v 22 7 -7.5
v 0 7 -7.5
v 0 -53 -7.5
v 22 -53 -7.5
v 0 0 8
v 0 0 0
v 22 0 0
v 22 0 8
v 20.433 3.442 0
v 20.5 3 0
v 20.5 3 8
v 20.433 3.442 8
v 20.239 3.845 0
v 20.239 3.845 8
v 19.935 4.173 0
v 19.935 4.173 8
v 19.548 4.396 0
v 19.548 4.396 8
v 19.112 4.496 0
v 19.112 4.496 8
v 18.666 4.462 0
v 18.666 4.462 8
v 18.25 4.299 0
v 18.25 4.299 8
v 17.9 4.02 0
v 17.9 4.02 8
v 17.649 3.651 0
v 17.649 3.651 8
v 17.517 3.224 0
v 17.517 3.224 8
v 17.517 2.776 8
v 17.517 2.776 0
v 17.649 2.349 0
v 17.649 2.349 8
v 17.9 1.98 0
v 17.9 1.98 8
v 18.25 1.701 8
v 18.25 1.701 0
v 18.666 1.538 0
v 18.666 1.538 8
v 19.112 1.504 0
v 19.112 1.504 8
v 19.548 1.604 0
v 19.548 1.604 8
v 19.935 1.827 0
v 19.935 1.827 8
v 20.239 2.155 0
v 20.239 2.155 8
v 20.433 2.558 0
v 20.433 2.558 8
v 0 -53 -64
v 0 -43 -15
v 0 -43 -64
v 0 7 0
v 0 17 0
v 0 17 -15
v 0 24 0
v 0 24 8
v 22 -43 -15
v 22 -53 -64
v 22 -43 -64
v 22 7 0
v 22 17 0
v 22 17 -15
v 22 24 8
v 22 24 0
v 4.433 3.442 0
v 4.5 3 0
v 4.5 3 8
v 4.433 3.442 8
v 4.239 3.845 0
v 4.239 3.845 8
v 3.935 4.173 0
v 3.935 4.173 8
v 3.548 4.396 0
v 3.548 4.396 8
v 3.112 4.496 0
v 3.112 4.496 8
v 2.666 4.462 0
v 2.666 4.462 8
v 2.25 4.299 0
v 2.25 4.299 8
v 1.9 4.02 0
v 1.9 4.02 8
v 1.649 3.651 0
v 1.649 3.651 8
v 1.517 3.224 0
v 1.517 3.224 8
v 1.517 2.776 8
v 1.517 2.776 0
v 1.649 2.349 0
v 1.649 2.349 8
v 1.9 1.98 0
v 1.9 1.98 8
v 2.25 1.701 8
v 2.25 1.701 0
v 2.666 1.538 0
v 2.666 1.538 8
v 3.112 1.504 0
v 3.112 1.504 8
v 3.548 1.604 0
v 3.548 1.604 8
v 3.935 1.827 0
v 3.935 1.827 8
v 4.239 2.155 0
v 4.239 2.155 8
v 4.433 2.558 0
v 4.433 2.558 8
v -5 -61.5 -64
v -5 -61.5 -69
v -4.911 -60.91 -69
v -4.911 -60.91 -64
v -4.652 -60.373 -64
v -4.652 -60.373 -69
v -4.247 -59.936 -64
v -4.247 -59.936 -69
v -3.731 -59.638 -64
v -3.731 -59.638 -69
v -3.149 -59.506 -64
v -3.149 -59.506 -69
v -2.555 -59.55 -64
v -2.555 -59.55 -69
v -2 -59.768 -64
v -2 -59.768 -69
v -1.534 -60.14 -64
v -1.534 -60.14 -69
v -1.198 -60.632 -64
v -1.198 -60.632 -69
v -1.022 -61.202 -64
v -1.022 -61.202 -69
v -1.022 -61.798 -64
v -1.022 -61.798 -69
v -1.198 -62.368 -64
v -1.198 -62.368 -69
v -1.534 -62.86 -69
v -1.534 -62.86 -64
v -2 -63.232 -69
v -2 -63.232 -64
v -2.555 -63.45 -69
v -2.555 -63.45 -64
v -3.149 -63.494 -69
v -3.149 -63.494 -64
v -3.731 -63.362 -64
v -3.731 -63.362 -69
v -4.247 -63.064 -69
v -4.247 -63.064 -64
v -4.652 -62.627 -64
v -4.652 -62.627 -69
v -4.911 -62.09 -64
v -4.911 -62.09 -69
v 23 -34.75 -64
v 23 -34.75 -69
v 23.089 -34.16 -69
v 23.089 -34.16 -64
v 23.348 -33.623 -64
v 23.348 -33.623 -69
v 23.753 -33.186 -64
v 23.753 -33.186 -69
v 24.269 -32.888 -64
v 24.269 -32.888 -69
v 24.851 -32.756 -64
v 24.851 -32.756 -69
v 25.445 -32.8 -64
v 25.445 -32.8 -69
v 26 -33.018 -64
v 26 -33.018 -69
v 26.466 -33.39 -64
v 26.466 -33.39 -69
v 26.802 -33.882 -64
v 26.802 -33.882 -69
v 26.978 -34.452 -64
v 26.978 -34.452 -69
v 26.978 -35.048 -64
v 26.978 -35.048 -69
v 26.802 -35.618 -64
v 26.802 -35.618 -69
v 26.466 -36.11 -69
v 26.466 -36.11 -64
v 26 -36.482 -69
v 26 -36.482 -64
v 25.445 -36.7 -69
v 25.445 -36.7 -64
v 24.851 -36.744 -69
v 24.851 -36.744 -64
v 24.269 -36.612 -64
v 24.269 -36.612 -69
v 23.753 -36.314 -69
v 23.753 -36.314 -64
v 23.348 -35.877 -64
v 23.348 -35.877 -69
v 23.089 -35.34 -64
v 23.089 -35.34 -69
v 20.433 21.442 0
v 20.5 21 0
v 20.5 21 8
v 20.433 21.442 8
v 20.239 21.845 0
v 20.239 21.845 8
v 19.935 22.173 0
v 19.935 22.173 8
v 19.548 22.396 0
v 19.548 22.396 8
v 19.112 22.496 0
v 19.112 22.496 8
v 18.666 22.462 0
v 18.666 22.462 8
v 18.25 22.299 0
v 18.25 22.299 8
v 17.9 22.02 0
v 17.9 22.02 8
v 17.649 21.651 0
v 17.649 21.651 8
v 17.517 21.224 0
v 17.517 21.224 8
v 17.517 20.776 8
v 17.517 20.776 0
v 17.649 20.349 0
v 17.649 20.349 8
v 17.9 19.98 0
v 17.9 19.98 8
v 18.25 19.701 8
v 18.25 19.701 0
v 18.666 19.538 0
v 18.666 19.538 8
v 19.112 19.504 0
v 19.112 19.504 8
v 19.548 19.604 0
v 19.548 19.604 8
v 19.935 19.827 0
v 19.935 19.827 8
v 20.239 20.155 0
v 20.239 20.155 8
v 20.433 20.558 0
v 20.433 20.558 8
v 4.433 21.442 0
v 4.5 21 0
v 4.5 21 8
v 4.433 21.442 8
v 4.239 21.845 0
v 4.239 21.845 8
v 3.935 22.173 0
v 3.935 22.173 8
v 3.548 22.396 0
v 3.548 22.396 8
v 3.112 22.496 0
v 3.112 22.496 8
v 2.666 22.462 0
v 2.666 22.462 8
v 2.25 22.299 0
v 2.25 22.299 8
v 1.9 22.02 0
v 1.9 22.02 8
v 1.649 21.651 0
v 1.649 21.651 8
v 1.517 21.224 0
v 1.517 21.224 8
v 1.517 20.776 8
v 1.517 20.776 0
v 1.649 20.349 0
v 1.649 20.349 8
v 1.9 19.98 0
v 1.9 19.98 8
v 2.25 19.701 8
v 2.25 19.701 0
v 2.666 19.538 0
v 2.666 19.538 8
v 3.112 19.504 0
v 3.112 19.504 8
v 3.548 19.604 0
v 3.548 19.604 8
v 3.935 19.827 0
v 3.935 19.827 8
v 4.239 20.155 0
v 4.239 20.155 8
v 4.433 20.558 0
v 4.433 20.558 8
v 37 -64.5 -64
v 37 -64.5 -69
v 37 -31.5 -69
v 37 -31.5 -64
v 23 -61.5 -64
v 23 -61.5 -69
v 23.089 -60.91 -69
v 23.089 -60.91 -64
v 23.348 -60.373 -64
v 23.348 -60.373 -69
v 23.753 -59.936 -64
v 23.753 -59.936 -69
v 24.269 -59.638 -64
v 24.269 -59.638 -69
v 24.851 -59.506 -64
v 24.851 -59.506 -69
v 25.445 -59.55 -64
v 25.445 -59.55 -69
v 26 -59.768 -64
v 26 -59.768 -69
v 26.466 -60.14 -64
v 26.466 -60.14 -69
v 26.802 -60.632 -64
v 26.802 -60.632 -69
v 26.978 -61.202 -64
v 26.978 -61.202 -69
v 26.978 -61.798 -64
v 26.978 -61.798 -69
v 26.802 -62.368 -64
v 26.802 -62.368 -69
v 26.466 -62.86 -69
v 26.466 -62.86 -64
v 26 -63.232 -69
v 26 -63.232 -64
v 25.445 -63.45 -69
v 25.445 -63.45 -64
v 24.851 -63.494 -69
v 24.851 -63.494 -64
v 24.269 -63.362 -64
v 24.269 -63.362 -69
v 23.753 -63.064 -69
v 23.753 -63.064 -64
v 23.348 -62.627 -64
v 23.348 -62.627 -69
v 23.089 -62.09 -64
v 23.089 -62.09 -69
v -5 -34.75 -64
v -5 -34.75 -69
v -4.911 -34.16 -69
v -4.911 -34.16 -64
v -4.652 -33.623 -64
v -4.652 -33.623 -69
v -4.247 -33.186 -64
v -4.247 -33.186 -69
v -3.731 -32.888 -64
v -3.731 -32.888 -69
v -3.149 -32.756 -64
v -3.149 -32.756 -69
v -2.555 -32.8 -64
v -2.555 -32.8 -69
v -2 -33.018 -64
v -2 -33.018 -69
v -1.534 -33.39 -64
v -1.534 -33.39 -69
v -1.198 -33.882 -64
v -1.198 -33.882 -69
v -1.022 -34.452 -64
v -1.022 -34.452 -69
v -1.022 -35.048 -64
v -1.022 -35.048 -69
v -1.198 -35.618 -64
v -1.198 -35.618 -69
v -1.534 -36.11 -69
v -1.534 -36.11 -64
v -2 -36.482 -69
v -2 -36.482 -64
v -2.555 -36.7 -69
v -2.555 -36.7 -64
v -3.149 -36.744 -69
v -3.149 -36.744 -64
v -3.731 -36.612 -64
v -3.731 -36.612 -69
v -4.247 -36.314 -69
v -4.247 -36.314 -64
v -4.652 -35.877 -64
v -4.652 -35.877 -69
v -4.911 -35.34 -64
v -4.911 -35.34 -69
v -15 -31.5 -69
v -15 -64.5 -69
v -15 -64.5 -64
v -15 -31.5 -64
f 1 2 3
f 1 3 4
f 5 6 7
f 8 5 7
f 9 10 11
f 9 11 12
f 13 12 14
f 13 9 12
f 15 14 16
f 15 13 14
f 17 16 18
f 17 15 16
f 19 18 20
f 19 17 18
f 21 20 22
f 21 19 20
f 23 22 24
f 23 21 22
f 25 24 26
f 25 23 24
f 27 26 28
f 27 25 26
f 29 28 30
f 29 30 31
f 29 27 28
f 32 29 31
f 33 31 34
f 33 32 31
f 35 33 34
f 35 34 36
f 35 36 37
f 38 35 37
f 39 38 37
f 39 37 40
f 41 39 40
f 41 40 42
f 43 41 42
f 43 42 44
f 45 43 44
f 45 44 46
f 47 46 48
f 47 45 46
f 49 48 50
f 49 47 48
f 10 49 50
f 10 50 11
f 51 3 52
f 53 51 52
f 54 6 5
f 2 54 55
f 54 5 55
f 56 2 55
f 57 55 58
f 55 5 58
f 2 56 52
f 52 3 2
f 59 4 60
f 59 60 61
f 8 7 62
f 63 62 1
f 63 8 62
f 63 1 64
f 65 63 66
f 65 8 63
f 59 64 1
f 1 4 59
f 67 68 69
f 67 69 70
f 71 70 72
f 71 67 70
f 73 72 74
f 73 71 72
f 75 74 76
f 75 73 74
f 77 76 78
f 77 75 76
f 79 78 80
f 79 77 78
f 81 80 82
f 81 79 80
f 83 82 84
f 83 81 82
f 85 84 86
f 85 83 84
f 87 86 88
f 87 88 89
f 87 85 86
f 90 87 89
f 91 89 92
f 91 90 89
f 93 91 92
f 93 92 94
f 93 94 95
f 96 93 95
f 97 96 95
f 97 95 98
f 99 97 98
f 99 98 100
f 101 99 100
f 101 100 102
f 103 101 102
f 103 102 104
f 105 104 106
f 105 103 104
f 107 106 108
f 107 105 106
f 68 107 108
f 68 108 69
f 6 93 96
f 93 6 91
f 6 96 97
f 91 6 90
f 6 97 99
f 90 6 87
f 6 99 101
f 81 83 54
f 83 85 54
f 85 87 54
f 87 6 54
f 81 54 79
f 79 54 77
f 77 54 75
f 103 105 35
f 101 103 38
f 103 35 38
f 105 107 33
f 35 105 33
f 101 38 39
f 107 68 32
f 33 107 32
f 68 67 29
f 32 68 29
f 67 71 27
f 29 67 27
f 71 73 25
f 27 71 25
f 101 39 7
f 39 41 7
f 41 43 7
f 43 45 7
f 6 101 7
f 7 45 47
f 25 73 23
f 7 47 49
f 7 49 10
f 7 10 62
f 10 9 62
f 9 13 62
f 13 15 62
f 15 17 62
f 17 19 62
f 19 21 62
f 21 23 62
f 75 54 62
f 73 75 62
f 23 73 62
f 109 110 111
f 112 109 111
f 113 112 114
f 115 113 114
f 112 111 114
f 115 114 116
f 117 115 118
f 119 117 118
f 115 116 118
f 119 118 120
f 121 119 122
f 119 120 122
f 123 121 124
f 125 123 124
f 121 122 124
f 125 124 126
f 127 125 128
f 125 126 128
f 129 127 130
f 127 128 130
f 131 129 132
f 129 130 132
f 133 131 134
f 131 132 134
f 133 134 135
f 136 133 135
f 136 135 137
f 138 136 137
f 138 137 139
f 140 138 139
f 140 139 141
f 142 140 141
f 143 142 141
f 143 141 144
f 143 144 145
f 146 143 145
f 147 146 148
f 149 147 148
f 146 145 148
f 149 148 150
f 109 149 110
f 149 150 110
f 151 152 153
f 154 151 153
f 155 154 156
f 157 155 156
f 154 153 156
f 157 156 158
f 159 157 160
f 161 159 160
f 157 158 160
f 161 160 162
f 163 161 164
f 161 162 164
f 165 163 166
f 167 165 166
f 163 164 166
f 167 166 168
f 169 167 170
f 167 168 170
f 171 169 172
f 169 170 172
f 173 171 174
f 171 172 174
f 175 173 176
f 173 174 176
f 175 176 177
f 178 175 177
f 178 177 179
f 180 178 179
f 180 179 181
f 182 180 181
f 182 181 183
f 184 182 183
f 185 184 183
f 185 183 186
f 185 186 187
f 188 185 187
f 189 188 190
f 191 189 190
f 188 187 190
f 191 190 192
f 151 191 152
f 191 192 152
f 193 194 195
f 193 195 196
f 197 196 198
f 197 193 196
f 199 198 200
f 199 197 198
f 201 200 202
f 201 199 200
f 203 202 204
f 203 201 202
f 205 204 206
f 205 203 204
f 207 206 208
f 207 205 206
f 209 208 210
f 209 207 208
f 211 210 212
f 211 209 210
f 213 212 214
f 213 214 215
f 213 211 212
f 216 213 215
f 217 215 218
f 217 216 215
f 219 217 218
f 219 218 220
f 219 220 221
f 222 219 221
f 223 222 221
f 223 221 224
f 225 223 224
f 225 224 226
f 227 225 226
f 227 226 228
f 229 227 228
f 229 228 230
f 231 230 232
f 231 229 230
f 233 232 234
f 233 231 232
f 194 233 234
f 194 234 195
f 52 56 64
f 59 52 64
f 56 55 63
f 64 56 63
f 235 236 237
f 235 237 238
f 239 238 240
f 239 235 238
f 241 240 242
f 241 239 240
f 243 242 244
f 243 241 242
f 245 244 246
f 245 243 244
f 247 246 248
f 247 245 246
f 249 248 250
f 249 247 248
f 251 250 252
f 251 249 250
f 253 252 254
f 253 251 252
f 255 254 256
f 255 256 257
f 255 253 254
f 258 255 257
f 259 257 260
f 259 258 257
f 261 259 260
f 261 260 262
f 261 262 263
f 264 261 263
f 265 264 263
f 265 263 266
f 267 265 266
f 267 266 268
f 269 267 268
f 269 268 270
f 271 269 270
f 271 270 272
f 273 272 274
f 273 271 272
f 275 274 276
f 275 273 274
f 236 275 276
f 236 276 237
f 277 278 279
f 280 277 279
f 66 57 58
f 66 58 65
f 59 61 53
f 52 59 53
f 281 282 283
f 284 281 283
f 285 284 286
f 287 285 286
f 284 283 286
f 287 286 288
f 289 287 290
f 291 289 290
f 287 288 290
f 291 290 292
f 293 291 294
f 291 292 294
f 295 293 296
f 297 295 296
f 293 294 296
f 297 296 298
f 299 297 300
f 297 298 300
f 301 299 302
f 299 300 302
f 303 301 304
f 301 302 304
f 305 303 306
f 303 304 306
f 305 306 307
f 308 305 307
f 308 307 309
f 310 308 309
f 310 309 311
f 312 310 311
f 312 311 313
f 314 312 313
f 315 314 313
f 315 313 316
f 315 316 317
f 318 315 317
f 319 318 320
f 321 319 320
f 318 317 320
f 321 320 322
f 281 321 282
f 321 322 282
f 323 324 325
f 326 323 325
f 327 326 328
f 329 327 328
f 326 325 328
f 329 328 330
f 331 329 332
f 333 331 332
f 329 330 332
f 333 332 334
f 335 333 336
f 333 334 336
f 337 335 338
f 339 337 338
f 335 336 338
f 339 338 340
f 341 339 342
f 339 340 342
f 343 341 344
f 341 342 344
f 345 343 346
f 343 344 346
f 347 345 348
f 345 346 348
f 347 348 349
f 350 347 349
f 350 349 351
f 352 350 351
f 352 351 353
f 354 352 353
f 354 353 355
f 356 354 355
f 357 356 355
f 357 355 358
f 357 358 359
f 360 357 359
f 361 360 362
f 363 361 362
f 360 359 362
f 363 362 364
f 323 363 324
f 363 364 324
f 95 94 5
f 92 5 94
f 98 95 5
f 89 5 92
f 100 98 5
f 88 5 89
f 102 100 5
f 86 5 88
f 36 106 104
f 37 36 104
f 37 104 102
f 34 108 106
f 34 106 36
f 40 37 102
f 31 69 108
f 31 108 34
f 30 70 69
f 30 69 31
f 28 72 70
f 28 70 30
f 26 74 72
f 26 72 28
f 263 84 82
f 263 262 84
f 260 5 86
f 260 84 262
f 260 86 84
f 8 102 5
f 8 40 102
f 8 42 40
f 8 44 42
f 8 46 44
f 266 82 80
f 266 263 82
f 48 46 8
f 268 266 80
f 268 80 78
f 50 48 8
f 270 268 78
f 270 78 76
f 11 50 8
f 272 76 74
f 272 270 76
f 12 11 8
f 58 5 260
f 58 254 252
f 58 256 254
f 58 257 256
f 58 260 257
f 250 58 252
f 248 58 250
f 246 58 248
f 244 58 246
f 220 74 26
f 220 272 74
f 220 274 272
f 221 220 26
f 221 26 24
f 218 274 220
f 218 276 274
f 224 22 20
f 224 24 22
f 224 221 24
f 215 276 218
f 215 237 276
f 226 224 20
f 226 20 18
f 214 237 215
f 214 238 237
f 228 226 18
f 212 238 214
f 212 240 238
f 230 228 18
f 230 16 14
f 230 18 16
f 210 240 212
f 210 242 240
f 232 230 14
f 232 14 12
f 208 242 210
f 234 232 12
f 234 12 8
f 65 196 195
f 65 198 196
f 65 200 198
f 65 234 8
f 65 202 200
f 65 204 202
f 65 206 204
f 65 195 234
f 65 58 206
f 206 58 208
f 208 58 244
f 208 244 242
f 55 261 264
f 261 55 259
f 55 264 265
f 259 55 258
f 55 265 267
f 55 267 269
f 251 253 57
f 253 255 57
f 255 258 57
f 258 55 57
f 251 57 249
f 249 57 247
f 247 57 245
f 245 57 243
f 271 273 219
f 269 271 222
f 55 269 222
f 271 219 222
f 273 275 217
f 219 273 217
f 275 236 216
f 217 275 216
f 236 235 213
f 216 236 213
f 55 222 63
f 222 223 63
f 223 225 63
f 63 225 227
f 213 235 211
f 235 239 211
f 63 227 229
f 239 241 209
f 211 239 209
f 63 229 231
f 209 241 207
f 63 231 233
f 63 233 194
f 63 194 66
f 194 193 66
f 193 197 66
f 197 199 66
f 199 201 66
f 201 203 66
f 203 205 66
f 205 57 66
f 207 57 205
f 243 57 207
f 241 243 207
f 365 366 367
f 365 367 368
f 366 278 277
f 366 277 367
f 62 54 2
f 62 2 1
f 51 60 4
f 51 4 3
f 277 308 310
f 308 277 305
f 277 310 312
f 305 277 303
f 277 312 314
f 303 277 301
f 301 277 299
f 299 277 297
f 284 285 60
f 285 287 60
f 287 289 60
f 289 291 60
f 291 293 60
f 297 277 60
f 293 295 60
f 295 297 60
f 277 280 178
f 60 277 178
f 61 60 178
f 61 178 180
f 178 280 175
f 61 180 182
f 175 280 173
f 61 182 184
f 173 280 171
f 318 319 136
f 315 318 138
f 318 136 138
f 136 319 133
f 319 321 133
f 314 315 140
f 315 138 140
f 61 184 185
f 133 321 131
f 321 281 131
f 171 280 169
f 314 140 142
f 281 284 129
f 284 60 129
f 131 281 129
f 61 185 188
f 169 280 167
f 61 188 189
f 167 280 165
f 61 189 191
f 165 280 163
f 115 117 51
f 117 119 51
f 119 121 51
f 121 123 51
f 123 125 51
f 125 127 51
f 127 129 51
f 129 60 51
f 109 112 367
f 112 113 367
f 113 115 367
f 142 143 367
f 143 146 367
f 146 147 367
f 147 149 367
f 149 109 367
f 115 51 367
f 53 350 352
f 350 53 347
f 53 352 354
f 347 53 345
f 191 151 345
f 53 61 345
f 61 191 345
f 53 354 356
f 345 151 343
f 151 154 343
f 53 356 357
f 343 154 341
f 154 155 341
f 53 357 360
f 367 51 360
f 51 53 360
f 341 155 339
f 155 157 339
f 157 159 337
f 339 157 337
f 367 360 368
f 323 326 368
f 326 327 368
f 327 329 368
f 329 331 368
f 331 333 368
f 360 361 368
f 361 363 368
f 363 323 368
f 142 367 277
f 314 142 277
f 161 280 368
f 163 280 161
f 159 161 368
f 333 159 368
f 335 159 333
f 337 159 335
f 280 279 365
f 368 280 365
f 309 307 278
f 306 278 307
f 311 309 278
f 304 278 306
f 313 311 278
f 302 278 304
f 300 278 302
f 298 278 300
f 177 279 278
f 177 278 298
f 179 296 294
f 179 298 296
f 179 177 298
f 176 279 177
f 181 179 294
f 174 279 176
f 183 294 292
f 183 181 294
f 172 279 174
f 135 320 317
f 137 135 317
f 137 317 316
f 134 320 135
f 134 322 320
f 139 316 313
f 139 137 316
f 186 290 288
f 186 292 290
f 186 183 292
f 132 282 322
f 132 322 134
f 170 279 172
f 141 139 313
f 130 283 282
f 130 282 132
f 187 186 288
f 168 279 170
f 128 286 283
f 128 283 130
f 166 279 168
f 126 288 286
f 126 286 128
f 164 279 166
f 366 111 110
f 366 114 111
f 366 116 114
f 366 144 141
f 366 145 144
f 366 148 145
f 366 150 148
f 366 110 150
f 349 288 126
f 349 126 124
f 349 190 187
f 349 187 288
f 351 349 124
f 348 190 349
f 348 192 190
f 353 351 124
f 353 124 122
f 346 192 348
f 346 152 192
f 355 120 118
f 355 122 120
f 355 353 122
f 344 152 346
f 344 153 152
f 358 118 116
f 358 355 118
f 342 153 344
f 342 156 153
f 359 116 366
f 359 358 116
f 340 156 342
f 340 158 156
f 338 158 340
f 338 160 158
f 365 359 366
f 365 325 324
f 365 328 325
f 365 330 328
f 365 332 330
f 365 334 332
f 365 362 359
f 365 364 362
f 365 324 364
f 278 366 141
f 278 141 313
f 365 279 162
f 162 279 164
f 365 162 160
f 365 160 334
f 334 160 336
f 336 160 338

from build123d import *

# Parameters (mm, degrees)
ESQUISSE1_W             = 22
ESQUISSE1_H             = 24
ESQUISSE1_R             = 1.5
BOSS_EXTRU_1_DEPTH      = 8
ESQUISSE1_3_W           = 22
ESQUISSE1_3_H           = 10
BOSS_EXTRU_2_DEPTH      = 15
ESQUISSE2_W             = 22
ESQUISSE2_H             = 7.5
BOSS_EXTRU_3_DEPTH      = 60
ESQUISSE3_W             = 22
ESQUISSE3_H             = 10
BOSS_EXTRU_4_DEPTH      = 54
ESQUISSE4_W             = 52
ESQUISSE4_H             = 33
BOSS_EXTRU_5_DEPTH      = 5
ESQUISSE6_R             = 2
ENL_V_MAT_EXTRU_1_DEPTH = 5


with BuildPart() as part:
    # Esquisse1 → Boss.-Extru.1 (new body)
    with BuildSketch(Plane.XY):
        with Locations((11, 12)):
            Rectangle(ESQUISSE1_W, ESQUISSE1_H)
        with Locations((3, 3)):
            Circle(ESQUISSE1_R, mode=Mode.SUBTRACT)
        with Locations((19, 3)):
            Circle(ESQUISSE1_R, mode=Mode.SUBTRACT)
        with Locations((19, 21)):
            Circle(ESQUISSE1_R, mode=Mode.SUBTRACT)
        with Locations((3, 21)):
            Circle(ESQUISSE1_R, mode=Mode.SUBTRACT)
    extrude(amount=BOSS_EXTRU_1_DEPTH)

    # Esquisse1<3> → Boss.-Extru.2 (add)
    with BuildSketch(Plane.XY):
        with Locations((11, 12)):
            Rectangle(ESQUISSE1_3_W, ESQUISSE1_3_H)
    extrude(amount=-BOSS_EXTRU_2_DEPTH)

    # Esquisse2 → Boss.-Extru.3 (add)
    with BuildSketch(Plane.XZ.offset(-7)):
        with Locations((11, -11.25)):
            Rectangle(ESQUISSE2_W, ESQUISSE2_H)
    extrude(amount=BOSS_EXTRU_3_DEPTH)

    # Esquisse3 → Boss.-Extru.4 (add)
    with BuildSketch(Plane(origin=(0, 0, -15), x_dir=(-1, 0, 0), z_dir=(0, 0, -1))):
        with Locations((-11, -48)):
            Rectangle(ESQUISSE3_W, ESQUISSE3_H)
    extrude(amount=BOSS_EXTRU_4_DEPTH)

    # Esquisse4 → Boss.-Extru.5 (add)
    with BuildSketch(Plane(origin=(0, 0, -69), x_dir=(-1, 0, 0), z_dir=(0, 0, -1))):
        with Locations((-11, -48)):
            Rectangle(ESQUISSE4_W, ESQUISSE4_H)
    extrude(amount=-BOSS_EXTRU_5_DEPTH)

    # Esquisse6 → Enlèv. mat.-Extru.1 (cut)
    with BuildSketch(Plane(origin=(0, 0, -69), x_dir=(-1, 0, 0), z_dir=(0, 0, -1))):
        with Locations((-25, -34.75)):
            Circle(ESQUISSE6_R)
        with Locations((-25, -61.5)):
            Circle(ESQUISSE6_R)
        with Locations((3, -34.75)):
            Circle(ESQUISSE6_R)
        with Locations((3, -61.5)):
            Circle(ESQUISSE6_R)
    extrude(amount=-ENL_V_MAT_EXTRU_1_DEPTH, mode=Mode.SUBTRACT)


solid = part.part
